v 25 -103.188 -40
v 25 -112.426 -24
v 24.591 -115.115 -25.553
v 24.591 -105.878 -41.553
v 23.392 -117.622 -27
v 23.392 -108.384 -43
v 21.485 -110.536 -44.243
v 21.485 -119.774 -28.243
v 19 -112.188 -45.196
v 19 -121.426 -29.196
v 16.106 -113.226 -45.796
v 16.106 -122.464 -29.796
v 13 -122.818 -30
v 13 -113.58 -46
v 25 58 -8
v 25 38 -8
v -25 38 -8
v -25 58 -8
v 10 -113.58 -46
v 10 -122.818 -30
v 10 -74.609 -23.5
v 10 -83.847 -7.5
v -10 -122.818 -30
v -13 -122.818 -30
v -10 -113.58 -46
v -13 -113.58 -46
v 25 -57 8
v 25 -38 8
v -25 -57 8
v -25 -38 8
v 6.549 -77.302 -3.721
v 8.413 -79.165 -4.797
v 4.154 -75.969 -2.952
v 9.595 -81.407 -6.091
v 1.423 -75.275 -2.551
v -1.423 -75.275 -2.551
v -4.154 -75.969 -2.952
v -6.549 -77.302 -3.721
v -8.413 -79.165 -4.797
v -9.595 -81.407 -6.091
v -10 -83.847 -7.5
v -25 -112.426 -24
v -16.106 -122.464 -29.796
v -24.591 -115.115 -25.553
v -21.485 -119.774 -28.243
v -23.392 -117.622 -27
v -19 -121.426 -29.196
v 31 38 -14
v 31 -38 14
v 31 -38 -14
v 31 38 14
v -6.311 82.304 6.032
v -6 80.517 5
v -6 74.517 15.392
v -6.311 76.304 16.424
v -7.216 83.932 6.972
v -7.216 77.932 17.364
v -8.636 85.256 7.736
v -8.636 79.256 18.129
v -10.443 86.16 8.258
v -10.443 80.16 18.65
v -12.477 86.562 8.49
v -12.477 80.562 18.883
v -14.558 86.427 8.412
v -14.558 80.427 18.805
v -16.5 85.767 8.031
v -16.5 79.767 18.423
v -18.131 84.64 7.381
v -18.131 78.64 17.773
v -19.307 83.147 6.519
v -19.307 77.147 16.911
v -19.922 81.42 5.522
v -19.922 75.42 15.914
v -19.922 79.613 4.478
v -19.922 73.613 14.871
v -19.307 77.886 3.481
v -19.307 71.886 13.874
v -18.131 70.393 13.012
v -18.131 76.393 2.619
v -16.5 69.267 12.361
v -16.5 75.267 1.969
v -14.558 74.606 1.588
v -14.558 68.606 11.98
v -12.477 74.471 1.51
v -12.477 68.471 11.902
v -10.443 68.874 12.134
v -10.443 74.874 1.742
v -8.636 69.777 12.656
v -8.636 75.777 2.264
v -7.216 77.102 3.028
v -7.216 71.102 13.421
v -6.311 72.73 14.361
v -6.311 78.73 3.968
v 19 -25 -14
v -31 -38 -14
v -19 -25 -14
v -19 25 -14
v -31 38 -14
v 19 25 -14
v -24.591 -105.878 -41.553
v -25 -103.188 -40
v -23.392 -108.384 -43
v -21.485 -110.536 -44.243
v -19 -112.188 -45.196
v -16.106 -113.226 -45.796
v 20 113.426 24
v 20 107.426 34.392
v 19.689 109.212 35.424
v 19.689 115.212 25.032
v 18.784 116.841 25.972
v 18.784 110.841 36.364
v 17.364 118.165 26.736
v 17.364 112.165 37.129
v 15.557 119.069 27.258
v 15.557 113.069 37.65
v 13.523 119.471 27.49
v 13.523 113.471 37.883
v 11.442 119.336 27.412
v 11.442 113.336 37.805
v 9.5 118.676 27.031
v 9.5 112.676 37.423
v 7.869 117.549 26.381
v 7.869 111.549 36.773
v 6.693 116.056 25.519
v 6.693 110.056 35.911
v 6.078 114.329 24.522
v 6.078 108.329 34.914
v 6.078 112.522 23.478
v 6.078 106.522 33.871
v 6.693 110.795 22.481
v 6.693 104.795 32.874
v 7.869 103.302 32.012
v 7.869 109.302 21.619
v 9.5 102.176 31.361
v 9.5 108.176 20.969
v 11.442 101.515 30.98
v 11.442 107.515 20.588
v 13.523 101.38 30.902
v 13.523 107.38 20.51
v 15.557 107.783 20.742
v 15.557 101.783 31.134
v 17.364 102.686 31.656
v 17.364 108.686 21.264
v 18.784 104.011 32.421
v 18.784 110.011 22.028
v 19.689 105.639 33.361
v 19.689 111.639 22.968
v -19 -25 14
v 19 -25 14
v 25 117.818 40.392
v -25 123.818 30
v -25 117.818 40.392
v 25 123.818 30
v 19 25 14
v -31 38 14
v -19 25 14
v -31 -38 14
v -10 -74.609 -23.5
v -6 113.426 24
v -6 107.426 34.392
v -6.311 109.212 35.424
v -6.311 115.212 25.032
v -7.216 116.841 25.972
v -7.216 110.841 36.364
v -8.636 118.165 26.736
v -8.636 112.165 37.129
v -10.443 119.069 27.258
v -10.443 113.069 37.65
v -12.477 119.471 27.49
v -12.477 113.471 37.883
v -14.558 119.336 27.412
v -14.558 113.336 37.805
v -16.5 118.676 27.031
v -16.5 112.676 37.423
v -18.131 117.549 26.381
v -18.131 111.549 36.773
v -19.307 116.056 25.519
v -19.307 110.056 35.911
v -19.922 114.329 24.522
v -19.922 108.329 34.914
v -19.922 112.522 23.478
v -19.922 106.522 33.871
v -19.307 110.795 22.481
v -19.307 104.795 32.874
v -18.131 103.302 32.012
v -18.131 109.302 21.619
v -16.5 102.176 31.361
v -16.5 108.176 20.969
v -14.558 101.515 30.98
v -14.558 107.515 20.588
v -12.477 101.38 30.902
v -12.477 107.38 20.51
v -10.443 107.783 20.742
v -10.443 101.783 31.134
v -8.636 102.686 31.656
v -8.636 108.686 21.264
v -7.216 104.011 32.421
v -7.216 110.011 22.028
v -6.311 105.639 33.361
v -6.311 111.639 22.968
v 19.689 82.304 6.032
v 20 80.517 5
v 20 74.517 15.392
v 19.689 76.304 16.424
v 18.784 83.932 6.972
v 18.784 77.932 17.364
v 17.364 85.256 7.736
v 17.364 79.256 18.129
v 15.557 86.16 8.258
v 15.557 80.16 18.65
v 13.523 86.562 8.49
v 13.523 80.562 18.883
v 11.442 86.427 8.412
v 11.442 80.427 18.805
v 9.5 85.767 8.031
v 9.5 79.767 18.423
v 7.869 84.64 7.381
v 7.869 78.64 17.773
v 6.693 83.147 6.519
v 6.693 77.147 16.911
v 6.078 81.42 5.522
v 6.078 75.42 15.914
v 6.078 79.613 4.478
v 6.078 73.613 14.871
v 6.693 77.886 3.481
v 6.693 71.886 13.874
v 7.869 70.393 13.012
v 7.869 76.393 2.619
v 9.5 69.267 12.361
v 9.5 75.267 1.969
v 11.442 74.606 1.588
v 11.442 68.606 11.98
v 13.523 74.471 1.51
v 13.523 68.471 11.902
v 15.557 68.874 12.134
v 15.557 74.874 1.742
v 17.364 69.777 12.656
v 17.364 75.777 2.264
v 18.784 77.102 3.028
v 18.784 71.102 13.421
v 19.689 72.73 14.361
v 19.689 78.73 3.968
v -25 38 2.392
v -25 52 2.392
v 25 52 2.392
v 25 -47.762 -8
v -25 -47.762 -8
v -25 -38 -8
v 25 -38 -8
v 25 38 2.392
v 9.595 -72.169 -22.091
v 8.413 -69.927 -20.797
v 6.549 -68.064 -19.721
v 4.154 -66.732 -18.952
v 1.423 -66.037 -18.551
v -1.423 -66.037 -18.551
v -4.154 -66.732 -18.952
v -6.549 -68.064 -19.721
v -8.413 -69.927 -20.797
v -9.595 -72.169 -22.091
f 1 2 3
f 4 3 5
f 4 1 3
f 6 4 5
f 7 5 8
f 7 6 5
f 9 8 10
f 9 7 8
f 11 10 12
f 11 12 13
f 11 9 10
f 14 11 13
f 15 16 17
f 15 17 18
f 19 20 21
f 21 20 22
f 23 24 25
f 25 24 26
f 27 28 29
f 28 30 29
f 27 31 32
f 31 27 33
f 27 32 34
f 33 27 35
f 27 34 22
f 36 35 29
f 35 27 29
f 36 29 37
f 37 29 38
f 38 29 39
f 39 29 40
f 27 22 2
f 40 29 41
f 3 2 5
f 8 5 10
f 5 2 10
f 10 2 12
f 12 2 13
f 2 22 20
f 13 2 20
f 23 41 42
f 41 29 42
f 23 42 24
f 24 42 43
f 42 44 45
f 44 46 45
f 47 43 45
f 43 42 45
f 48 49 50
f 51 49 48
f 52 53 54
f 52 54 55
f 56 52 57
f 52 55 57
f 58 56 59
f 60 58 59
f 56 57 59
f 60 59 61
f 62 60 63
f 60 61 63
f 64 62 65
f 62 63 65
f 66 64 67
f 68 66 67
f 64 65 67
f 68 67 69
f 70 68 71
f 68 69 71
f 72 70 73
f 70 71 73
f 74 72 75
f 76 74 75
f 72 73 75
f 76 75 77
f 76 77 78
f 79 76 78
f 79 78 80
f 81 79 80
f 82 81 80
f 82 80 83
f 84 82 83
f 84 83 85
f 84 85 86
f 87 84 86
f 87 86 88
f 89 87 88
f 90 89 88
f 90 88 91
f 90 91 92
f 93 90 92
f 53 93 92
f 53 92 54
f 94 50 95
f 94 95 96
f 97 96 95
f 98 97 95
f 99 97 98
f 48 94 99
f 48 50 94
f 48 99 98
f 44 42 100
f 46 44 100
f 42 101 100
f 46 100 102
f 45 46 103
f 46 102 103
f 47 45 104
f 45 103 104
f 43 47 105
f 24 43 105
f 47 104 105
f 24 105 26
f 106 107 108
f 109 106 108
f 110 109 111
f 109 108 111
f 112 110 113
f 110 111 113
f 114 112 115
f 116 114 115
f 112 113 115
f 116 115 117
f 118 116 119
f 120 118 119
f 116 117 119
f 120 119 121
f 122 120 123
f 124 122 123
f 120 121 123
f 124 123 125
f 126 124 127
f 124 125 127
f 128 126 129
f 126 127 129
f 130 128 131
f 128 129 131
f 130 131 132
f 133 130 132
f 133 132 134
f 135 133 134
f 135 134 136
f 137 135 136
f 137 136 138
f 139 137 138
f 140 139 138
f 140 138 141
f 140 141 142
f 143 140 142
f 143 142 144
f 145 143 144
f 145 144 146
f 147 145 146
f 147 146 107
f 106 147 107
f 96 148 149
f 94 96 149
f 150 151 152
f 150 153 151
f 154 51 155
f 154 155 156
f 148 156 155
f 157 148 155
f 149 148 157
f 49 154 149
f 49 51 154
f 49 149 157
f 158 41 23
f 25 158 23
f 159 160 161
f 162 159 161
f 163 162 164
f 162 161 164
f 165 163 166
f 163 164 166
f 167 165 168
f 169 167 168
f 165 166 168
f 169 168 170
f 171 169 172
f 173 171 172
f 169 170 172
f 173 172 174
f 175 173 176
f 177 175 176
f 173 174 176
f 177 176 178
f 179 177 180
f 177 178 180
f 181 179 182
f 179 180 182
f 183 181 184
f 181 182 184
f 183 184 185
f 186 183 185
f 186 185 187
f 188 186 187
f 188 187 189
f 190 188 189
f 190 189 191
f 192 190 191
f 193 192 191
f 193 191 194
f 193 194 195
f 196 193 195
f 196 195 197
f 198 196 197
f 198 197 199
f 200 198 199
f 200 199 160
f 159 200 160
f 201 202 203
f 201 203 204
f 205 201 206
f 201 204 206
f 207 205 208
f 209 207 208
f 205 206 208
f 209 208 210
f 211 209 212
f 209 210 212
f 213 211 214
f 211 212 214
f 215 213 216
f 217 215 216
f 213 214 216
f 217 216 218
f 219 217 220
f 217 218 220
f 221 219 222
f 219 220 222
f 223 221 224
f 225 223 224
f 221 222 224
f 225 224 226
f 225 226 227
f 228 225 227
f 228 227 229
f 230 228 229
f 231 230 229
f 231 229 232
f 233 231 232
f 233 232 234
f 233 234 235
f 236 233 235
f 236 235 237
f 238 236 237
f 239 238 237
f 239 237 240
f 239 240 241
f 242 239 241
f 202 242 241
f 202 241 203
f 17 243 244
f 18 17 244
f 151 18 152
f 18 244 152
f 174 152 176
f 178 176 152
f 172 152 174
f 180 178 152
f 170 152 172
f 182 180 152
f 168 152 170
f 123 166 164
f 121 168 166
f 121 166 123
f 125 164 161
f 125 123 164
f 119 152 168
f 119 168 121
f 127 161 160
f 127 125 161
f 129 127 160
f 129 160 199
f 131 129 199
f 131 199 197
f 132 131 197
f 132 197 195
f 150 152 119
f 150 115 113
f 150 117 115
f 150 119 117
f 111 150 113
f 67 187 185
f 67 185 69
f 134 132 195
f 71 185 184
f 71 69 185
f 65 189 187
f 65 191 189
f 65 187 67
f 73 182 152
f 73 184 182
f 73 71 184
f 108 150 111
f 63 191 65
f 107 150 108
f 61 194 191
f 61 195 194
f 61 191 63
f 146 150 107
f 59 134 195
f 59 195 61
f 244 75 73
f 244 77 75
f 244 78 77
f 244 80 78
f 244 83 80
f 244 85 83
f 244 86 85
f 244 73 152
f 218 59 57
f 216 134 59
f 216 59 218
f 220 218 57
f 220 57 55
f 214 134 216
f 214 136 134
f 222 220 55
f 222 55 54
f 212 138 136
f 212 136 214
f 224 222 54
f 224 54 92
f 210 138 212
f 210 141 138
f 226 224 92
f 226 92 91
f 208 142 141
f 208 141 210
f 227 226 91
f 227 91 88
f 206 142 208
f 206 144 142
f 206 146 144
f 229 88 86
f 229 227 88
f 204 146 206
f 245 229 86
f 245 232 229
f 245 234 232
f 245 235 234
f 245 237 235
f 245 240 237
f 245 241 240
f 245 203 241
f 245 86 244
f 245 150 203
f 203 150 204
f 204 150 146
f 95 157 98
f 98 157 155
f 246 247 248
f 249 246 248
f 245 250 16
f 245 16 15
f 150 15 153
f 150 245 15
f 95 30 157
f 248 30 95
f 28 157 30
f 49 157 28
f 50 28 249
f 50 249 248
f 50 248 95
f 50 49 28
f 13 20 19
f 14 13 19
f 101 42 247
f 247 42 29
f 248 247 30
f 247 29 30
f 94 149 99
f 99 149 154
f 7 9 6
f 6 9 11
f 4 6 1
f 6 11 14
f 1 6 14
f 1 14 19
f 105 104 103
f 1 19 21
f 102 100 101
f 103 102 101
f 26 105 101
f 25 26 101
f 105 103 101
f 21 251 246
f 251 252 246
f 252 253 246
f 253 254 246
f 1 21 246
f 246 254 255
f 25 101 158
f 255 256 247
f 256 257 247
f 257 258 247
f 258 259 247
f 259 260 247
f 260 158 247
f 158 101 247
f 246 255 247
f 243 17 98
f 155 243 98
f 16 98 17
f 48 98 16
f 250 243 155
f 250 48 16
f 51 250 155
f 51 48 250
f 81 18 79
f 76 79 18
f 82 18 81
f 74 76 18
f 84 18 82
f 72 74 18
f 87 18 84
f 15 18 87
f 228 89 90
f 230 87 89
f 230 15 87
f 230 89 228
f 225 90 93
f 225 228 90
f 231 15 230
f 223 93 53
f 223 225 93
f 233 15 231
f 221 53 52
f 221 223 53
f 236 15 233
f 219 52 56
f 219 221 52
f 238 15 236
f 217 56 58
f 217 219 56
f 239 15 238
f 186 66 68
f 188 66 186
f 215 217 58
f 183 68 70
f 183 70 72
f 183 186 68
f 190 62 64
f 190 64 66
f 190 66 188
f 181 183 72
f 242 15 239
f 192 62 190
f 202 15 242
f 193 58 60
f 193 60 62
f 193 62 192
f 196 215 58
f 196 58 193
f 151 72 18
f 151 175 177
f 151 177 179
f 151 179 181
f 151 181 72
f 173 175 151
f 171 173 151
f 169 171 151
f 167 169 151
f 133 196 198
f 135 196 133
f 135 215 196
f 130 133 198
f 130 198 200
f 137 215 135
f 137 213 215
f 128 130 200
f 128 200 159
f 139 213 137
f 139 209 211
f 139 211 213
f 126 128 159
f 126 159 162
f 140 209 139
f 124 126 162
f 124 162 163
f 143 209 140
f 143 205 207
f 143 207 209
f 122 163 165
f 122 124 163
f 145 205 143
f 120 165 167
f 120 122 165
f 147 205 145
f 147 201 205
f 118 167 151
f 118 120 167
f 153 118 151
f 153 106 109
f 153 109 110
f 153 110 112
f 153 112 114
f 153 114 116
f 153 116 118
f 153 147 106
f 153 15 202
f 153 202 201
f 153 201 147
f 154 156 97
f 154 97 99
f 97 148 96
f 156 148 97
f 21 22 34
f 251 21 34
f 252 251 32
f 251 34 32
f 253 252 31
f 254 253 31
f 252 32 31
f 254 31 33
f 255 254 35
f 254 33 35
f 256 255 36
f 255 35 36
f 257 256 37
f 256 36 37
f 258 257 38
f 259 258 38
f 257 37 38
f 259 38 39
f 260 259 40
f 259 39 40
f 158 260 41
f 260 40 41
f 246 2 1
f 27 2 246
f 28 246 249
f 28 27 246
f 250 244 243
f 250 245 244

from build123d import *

# Parameters (mm, degrees)
F1_DEPTH = 31
F2_DEPTH = 25
F4_DEPTH = 137.1753371482
F5_R     = 12
F6_R     = 7
F7_DEPTH = 77.8189306876
F8_W     = 38
F8_H     = 50
F9_DEPTH = 60.001


# Not quite as in the source:
# - a feature of the source that left no trace in its solid (it failed there, or was rolled back) is left out


with BuildPart() as f1:
    # F0 (on Right) → F1 (new body, symmetric)
    with BuildSketch(Plane.YZ):
        Polygon((38, 2.3923048454), (38, 14), (-38, 14), (-38, 8), (-38, -8), (-38, -14), (38, -14), (38, -8), align=None)
    extrude(amount=F1_DEPTH, both=True)

    # F0 (on Right) → F2 (join, symmetric)
    with BuildSketch(Plane.YZ):
        Polygon((-38, -8), (-38, 8), (-57, 8), (-122.8179306876, -30), (-113.5803263806, -46), (-47.762395693, -8), align=None)
        Polygon((52, 2.3923048454), (38, 2.3923048454), (38, -8), (58, -8), (123.8179306876, 30), (117.8179306876, 40.3923048454), align=None)
    extrude(amount=F2_DEPTH, both=True)

    # F3 (on face) → F4 (cut, through all)
    with BuildSketch(Plane(origin=(0, -17.7141016151, 30.6817240079), x_dir=(1, 0, 0), z_dir=(0, -0.5, 0.8660254038))):
        with BuildLine():
            Line((10, -121.3634480157), (10, -76.3634480157))
            ThreePointArc((10, -76.3634480157), (0, -86.3634480157), (-10, -76.3634480157))
            Line((-10, -76.3634480157), (-10, -121.3634480157))
            Line((-10, -121.3634480157), (10, -121.3634480157))
        make_face()
        with BuildLine():
            ThreePointArc((-10, -76.3634480157), (0, -86.3634480157), (10, -76.3634480157))
            ThreePointArc((10, -76.3634480157), (0, -66.3634480157), (-10, -76.3634480157))
        make_face()
    extrude(amount=-F4_DEPTH, mode=Mode.SUBTRACT)

    # F5
    f5_edges = [f1.edges().sort_by_distance(p)[0] for p in [
        (25, -118.199129, -38),
        (-25, -118.199129, -38),
    ]]
    fillet(f5_edges, radius=F5_R)

    # F6 (on face) → F7 (cut, through all)
    with BuildSketch(Plane(origin=(0, 11.9641016151, -20.7224318643), x_dir=(1, 0, 0), z_dir=(0, -0.5, 0.8660254038))):
        with Locations((-13, 110.2294734195)):
            Circle(F6_R)
        with Locations((13, 110.2294734195)):
            Circle(F6_R)
        with Locations((13, 72.2294734195)):
            Circle(F6_R)
        with Locations((-13, 72.2294734195)):
            Circle(F6_R)
    extrude(amount=-F7_DEPTH, mode=Mode.SUBTRACT)

    # F8 (on face) → F9 (cut, through all)
    with BuildSketch(Plane.XY.offset(14)):
        Rectangle(F8_W, F8_H)
    extrude(amount=-F9_DEPTH, mode=Mode.SUBTRACT)


solid = f1.part
